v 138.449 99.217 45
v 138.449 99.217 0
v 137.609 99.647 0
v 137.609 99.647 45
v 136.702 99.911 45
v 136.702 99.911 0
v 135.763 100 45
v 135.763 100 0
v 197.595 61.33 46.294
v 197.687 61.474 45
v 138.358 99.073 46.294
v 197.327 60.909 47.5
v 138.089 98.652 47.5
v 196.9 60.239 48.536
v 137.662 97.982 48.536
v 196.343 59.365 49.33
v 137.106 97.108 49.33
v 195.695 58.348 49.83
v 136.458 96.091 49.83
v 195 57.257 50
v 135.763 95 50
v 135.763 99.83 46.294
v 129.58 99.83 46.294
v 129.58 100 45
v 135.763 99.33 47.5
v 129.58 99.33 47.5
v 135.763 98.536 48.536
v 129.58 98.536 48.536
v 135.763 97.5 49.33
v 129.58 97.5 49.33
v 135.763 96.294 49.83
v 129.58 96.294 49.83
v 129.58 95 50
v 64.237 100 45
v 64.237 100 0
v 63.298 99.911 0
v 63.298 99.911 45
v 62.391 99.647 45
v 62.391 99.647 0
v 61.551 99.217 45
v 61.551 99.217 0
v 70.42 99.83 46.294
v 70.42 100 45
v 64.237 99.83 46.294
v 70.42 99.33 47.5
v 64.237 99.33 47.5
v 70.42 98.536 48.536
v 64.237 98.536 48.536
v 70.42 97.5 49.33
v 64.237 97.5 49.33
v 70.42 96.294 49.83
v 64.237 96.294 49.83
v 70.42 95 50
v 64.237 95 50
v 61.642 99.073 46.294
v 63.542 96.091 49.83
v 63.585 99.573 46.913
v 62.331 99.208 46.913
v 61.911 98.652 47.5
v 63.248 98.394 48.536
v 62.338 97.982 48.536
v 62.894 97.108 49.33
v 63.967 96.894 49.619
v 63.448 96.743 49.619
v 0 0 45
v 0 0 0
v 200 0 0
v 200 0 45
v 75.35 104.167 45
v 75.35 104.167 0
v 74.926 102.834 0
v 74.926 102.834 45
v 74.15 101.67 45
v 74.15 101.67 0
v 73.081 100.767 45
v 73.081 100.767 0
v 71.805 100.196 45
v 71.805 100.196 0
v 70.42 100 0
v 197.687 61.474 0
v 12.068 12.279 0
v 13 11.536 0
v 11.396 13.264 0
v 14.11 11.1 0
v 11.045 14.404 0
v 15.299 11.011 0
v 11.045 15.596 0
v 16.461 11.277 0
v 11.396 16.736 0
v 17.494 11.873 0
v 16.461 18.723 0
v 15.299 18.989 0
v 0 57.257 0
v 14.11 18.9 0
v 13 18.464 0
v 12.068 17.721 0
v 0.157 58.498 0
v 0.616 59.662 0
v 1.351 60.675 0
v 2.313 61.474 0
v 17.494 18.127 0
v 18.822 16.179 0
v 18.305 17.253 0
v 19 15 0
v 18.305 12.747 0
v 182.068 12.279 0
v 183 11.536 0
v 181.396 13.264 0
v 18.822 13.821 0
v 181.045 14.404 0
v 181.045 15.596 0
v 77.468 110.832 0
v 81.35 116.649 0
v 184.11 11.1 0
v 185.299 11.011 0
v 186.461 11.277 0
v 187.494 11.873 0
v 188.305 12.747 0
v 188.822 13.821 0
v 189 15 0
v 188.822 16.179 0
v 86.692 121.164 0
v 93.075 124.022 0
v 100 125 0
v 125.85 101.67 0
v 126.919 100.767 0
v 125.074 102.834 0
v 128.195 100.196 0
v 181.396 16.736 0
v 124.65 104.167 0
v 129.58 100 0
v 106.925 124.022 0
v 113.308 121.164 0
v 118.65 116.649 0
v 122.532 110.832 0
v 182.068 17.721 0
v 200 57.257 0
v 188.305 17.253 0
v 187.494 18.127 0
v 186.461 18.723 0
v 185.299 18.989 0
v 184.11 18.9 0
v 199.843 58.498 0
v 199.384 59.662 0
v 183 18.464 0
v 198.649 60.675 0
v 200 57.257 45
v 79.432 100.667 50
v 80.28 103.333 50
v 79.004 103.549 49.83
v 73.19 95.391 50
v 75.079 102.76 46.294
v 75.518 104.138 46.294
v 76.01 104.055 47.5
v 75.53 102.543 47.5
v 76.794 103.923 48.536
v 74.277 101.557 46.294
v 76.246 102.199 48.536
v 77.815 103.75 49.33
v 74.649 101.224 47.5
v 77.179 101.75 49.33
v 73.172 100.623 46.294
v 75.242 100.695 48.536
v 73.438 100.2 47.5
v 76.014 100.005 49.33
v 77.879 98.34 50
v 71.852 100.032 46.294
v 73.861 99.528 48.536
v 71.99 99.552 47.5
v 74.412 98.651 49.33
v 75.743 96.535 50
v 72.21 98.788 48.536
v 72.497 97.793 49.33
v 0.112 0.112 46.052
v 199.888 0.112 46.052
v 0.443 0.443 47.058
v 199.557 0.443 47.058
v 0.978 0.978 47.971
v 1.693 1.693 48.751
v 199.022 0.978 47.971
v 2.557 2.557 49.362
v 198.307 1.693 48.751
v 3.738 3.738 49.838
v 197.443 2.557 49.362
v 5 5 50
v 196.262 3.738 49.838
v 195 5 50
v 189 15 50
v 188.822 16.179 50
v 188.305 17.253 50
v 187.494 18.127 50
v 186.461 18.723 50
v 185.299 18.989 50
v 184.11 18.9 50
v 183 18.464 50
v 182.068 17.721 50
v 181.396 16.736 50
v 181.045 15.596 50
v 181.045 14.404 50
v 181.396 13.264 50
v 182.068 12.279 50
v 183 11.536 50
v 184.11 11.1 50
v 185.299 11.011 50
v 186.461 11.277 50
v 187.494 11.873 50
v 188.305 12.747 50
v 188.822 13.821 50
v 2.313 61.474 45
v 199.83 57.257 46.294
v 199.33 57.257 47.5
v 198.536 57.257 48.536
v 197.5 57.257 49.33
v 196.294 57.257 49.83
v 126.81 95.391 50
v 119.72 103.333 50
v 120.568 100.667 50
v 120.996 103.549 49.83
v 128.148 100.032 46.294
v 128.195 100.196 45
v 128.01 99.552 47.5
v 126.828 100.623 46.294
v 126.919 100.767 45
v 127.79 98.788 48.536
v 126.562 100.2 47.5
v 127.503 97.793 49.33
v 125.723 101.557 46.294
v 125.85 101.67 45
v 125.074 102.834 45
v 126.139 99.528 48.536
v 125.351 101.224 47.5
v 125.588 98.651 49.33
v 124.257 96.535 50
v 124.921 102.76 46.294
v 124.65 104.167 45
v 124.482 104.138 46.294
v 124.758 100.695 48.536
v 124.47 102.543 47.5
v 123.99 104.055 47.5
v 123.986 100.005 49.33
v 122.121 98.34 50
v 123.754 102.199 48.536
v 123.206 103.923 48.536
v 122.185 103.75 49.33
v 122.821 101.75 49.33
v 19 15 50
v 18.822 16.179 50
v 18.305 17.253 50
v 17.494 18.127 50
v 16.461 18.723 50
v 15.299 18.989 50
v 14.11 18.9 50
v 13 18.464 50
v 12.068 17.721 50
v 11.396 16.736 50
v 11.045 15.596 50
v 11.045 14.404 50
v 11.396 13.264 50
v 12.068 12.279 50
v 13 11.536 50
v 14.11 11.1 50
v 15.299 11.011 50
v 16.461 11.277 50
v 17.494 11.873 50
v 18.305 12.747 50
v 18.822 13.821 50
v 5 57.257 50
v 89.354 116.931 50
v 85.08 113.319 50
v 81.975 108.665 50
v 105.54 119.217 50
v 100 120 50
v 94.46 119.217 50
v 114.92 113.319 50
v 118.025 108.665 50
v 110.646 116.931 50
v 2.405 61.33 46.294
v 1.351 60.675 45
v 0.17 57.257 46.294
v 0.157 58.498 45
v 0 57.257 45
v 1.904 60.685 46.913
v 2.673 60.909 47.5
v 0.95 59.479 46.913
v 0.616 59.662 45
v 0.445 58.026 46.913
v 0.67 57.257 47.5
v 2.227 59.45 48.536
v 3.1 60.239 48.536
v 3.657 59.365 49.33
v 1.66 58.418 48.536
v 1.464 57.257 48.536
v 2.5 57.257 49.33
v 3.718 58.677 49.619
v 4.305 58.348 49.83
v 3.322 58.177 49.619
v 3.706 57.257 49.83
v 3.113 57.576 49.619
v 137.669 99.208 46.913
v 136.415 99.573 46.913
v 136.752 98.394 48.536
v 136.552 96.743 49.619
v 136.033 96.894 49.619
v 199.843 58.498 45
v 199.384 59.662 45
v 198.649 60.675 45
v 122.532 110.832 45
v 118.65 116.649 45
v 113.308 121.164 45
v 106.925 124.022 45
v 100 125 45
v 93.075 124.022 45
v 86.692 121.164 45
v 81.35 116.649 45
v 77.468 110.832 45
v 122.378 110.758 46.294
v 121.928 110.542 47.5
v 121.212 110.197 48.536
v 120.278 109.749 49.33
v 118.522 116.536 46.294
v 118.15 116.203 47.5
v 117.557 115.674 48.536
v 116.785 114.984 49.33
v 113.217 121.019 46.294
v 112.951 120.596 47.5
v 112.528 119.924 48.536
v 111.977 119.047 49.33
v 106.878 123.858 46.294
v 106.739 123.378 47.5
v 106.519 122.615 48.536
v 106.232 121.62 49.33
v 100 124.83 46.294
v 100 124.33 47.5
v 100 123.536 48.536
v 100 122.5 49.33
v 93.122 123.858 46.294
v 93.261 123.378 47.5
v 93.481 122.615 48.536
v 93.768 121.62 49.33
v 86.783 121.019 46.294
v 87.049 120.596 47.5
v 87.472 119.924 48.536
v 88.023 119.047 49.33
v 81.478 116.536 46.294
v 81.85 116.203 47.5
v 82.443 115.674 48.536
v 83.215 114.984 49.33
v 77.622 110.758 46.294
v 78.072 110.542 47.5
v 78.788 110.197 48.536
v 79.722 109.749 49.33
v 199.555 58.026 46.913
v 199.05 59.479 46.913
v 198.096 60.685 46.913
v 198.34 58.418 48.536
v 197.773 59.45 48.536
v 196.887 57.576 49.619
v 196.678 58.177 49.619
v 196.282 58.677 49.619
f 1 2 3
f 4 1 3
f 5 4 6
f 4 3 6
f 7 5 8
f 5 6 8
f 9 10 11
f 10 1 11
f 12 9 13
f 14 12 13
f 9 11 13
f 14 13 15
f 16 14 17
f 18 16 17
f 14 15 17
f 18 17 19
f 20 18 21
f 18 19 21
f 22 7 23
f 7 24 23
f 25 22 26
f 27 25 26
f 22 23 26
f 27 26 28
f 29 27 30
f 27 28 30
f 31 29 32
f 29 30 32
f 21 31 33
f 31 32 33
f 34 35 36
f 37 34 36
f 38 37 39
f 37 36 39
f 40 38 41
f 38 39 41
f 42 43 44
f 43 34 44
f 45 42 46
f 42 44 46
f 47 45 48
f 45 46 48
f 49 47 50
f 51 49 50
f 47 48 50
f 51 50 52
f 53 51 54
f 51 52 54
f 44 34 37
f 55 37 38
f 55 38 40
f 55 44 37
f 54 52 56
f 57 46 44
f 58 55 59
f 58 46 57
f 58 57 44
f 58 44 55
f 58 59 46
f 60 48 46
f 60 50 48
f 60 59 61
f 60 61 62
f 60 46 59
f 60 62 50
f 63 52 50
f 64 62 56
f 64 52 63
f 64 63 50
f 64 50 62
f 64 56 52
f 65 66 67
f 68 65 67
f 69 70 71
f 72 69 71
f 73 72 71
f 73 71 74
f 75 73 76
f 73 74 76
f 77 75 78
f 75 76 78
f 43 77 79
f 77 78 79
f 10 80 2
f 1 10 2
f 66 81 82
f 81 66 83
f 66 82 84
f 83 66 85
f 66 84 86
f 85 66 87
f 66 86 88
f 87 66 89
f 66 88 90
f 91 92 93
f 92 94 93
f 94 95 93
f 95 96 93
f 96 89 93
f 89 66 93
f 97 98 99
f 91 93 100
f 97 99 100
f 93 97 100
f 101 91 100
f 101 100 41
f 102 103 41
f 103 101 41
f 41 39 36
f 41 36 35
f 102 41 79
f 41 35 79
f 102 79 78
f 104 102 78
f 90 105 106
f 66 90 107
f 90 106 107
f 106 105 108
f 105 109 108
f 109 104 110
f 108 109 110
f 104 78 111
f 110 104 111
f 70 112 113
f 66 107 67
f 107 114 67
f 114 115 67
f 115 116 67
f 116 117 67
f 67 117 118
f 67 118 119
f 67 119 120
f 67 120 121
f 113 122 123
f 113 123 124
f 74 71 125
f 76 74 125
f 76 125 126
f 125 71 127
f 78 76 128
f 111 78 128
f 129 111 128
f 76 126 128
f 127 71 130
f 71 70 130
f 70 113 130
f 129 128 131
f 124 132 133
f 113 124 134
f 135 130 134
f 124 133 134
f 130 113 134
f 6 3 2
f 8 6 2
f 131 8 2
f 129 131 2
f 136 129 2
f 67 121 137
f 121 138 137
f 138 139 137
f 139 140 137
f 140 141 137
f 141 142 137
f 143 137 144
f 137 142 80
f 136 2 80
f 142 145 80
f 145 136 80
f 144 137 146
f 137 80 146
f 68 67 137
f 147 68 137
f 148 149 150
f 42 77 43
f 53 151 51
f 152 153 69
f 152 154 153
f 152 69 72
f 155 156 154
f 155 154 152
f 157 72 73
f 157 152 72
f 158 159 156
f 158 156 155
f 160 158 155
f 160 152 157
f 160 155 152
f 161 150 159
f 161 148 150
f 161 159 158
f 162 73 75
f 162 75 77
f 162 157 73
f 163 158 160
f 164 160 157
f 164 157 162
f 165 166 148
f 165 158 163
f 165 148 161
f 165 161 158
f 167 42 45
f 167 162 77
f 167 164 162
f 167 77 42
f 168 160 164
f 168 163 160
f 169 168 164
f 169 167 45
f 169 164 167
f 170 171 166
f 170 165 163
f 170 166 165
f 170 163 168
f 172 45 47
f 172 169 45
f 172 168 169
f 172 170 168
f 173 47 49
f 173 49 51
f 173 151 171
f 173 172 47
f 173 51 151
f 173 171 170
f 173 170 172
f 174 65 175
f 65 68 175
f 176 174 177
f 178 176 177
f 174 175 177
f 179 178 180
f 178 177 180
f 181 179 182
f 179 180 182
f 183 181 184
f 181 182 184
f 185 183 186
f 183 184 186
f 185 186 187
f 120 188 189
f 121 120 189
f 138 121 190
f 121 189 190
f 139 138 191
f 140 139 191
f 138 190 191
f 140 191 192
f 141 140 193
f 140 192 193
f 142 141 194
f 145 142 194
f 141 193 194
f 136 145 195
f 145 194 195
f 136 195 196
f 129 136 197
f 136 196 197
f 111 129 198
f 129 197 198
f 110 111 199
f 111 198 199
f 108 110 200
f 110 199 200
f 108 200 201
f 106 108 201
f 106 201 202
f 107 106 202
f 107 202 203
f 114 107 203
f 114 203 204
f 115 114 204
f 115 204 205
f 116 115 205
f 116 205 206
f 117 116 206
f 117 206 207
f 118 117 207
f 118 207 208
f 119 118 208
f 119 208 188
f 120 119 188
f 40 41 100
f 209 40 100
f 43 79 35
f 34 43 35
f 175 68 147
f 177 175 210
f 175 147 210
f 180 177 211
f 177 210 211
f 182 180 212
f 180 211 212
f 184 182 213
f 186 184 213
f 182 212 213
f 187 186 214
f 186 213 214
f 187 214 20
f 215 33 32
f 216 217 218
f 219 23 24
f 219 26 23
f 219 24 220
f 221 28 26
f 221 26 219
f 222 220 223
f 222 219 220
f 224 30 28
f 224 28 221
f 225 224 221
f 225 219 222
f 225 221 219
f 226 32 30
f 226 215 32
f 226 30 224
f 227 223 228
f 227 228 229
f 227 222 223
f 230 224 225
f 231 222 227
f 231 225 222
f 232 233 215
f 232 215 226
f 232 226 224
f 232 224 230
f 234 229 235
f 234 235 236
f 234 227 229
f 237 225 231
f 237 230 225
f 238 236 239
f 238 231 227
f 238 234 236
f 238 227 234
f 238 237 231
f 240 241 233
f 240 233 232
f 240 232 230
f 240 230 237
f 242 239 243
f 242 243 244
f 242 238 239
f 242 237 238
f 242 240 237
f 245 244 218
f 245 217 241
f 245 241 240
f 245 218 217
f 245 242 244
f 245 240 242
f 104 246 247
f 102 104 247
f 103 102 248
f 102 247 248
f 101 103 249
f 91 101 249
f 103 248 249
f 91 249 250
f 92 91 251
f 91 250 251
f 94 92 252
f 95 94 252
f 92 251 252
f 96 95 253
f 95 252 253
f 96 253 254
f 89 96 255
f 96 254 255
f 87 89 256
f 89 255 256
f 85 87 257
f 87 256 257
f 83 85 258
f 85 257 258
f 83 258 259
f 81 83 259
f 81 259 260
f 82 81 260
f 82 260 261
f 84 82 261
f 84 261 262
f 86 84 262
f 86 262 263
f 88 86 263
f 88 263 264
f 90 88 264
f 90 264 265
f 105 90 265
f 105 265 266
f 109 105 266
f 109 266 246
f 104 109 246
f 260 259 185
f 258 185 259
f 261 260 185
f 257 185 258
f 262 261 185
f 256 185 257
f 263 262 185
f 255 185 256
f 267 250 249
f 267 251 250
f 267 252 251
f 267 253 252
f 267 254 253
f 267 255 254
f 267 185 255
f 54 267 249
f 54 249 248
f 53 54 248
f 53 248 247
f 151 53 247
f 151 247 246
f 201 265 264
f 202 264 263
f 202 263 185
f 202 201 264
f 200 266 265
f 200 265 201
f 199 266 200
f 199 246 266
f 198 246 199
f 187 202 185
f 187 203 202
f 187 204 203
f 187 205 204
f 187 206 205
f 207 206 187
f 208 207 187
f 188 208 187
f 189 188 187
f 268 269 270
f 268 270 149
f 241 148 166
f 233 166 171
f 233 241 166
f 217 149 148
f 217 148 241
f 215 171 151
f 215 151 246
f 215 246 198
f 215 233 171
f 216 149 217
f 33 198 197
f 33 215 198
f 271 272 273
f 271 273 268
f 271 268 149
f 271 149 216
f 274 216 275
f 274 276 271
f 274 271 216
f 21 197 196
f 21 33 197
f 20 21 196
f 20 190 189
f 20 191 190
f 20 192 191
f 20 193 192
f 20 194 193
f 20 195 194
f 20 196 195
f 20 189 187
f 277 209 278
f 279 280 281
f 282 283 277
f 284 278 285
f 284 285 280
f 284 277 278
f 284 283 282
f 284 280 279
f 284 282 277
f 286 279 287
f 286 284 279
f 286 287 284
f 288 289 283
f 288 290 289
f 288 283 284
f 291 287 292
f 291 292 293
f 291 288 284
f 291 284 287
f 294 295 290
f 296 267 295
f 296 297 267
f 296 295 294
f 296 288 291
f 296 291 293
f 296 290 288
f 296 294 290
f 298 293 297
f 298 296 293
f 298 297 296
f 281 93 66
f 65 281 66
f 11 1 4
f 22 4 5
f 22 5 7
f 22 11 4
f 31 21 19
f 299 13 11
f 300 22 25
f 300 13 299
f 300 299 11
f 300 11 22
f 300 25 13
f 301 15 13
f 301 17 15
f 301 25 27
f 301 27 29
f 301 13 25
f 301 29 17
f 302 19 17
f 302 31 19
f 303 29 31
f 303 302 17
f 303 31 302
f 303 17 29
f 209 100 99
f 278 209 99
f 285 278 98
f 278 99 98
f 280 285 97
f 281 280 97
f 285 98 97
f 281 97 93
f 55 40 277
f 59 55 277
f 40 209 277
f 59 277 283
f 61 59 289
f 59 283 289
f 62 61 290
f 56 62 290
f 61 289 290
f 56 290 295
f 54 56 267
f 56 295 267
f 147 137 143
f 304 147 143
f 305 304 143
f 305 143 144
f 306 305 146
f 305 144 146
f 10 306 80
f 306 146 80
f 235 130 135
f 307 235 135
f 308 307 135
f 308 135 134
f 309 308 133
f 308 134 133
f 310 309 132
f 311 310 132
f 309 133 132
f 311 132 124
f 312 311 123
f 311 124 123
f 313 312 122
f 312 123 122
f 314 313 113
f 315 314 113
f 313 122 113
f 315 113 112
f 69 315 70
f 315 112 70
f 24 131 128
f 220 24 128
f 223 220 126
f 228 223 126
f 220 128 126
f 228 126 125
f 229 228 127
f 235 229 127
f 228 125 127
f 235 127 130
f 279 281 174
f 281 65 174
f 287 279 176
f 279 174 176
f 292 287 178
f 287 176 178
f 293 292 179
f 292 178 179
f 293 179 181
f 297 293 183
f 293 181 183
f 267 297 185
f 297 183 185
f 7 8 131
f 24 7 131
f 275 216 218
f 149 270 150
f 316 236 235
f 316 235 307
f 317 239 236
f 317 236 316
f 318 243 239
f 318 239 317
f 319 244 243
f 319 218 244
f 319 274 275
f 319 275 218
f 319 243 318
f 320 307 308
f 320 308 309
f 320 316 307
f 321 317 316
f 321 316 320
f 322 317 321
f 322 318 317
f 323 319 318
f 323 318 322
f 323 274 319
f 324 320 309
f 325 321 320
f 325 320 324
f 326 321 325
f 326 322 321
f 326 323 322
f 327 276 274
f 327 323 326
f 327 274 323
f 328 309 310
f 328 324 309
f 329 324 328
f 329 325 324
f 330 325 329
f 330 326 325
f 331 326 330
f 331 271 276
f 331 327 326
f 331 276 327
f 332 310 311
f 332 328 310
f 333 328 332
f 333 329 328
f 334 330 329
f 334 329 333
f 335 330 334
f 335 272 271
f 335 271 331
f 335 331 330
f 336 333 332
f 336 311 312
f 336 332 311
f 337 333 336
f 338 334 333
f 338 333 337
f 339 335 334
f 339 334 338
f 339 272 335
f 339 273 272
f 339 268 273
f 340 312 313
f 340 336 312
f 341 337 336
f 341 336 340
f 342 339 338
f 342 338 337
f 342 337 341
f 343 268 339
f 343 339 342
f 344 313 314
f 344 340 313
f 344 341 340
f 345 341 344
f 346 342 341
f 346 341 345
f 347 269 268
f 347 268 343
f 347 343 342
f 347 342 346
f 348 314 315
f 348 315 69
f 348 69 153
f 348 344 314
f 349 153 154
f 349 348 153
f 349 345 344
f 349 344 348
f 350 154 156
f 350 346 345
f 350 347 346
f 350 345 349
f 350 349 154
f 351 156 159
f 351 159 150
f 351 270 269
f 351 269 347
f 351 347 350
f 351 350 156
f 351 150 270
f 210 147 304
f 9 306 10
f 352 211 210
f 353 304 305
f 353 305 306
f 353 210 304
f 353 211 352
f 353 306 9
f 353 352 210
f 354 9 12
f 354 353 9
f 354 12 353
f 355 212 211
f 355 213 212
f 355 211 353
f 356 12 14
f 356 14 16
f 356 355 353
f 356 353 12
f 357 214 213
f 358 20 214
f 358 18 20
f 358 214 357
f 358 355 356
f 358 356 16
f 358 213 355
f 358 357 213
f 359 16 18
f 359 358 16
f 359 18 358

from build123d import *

# Parameters (mm, degrees)
F1_DEPTH = 50
F2_R     = 5
F3_R     = 4
F4_DEPTH = 50.001


with BuildPart() as f1:
    # F0 (on Top) → F1 (new body)
    with BuildSketch(Plane.XY):
        with BuildLine():
            Line((0, 57.2570811482), (0, 0))
            Line((0, 0), (200, 0))
            Line((200, 0), (200, 57.2570811482))
            ThreePointArc((200, 57.2570811482), (199.3836985076, 59.6619070036), (197.6867250421, 61.4738937535))
            Line((197.6867250421, 61.4738937535), (138.4492468932, 99.2168126053))
            ThreePointArc((138.4492468932, 99.2168126053), (137.1617961225, 99.8002116113), (135.7625218511, 100))
            Line((135.7625218511, 100), (129.5803989155, 100))
            ThreePointArc((129.5803989155, 100), (126.3529127937, 101.1811869209), (124.6503324296, 104.1666666667))
            ThreePointArc((124.6503324296, 104.1666666667), (100, 125), (75.3496675704, 104.1666666667))
            ThreePointArc((75.3496675704, 104.1666666667), (73.6470872063, 101.1811869209), (70.4196010845, 100))
            Line((70.4196010845, 100), (64.2374781489, 100))
            ThreePointArc((64.2374781489, 100), (62.8382038775, 99.8002116113), (61.5507531068, 99.2168126053))
            Line((61.5507531068, 99.2168126053), (2.3132749579, 61.4738937535))
            ThreePointArc((2.3132749579, 61.4738937535), (0.6163014924, 59.6619070036), (0, 57.2570811482))
        make_face()
    extrude(amount=F1_DEPTH)

    # F2
    f2_edges = [f1.edges().sort_by_distance(p)[0] for p in [
        (0, 28.628541, 50),
        (100, 0, 50),
        (200, 28.628541, 50),
        (199.383699, 59.661907, 50),
        (168.067986, 80.345353, 50),
        (137.161796, 99.800212, 50),
        (132.67146, 100, 50),
        (126.352913, 101.181187, 50),
        (100, 125, 50),
        (73.647087, 101.181187, 50),
        (67.32854, 100, 50),
        (62.838204, 99.800212, 50),
        (31.932014, 80.345353, 50),
        (0.616301, 59.661907, 50),
    ]]
    fillet(f2_edges, radius=F2_R)

    # F3 (on face) → F4 (cut, through all)
    with BuildSketch(Plane.XY.offset(50)):
        with Locations((185, 15)):
            Circle(F3_R)
        with Locations((15, 15)):
            Circle(F3_R)
    extrude(amount=-F4_DEPTH, mode=Mode.SUBTRACT)


solid = f1.part
